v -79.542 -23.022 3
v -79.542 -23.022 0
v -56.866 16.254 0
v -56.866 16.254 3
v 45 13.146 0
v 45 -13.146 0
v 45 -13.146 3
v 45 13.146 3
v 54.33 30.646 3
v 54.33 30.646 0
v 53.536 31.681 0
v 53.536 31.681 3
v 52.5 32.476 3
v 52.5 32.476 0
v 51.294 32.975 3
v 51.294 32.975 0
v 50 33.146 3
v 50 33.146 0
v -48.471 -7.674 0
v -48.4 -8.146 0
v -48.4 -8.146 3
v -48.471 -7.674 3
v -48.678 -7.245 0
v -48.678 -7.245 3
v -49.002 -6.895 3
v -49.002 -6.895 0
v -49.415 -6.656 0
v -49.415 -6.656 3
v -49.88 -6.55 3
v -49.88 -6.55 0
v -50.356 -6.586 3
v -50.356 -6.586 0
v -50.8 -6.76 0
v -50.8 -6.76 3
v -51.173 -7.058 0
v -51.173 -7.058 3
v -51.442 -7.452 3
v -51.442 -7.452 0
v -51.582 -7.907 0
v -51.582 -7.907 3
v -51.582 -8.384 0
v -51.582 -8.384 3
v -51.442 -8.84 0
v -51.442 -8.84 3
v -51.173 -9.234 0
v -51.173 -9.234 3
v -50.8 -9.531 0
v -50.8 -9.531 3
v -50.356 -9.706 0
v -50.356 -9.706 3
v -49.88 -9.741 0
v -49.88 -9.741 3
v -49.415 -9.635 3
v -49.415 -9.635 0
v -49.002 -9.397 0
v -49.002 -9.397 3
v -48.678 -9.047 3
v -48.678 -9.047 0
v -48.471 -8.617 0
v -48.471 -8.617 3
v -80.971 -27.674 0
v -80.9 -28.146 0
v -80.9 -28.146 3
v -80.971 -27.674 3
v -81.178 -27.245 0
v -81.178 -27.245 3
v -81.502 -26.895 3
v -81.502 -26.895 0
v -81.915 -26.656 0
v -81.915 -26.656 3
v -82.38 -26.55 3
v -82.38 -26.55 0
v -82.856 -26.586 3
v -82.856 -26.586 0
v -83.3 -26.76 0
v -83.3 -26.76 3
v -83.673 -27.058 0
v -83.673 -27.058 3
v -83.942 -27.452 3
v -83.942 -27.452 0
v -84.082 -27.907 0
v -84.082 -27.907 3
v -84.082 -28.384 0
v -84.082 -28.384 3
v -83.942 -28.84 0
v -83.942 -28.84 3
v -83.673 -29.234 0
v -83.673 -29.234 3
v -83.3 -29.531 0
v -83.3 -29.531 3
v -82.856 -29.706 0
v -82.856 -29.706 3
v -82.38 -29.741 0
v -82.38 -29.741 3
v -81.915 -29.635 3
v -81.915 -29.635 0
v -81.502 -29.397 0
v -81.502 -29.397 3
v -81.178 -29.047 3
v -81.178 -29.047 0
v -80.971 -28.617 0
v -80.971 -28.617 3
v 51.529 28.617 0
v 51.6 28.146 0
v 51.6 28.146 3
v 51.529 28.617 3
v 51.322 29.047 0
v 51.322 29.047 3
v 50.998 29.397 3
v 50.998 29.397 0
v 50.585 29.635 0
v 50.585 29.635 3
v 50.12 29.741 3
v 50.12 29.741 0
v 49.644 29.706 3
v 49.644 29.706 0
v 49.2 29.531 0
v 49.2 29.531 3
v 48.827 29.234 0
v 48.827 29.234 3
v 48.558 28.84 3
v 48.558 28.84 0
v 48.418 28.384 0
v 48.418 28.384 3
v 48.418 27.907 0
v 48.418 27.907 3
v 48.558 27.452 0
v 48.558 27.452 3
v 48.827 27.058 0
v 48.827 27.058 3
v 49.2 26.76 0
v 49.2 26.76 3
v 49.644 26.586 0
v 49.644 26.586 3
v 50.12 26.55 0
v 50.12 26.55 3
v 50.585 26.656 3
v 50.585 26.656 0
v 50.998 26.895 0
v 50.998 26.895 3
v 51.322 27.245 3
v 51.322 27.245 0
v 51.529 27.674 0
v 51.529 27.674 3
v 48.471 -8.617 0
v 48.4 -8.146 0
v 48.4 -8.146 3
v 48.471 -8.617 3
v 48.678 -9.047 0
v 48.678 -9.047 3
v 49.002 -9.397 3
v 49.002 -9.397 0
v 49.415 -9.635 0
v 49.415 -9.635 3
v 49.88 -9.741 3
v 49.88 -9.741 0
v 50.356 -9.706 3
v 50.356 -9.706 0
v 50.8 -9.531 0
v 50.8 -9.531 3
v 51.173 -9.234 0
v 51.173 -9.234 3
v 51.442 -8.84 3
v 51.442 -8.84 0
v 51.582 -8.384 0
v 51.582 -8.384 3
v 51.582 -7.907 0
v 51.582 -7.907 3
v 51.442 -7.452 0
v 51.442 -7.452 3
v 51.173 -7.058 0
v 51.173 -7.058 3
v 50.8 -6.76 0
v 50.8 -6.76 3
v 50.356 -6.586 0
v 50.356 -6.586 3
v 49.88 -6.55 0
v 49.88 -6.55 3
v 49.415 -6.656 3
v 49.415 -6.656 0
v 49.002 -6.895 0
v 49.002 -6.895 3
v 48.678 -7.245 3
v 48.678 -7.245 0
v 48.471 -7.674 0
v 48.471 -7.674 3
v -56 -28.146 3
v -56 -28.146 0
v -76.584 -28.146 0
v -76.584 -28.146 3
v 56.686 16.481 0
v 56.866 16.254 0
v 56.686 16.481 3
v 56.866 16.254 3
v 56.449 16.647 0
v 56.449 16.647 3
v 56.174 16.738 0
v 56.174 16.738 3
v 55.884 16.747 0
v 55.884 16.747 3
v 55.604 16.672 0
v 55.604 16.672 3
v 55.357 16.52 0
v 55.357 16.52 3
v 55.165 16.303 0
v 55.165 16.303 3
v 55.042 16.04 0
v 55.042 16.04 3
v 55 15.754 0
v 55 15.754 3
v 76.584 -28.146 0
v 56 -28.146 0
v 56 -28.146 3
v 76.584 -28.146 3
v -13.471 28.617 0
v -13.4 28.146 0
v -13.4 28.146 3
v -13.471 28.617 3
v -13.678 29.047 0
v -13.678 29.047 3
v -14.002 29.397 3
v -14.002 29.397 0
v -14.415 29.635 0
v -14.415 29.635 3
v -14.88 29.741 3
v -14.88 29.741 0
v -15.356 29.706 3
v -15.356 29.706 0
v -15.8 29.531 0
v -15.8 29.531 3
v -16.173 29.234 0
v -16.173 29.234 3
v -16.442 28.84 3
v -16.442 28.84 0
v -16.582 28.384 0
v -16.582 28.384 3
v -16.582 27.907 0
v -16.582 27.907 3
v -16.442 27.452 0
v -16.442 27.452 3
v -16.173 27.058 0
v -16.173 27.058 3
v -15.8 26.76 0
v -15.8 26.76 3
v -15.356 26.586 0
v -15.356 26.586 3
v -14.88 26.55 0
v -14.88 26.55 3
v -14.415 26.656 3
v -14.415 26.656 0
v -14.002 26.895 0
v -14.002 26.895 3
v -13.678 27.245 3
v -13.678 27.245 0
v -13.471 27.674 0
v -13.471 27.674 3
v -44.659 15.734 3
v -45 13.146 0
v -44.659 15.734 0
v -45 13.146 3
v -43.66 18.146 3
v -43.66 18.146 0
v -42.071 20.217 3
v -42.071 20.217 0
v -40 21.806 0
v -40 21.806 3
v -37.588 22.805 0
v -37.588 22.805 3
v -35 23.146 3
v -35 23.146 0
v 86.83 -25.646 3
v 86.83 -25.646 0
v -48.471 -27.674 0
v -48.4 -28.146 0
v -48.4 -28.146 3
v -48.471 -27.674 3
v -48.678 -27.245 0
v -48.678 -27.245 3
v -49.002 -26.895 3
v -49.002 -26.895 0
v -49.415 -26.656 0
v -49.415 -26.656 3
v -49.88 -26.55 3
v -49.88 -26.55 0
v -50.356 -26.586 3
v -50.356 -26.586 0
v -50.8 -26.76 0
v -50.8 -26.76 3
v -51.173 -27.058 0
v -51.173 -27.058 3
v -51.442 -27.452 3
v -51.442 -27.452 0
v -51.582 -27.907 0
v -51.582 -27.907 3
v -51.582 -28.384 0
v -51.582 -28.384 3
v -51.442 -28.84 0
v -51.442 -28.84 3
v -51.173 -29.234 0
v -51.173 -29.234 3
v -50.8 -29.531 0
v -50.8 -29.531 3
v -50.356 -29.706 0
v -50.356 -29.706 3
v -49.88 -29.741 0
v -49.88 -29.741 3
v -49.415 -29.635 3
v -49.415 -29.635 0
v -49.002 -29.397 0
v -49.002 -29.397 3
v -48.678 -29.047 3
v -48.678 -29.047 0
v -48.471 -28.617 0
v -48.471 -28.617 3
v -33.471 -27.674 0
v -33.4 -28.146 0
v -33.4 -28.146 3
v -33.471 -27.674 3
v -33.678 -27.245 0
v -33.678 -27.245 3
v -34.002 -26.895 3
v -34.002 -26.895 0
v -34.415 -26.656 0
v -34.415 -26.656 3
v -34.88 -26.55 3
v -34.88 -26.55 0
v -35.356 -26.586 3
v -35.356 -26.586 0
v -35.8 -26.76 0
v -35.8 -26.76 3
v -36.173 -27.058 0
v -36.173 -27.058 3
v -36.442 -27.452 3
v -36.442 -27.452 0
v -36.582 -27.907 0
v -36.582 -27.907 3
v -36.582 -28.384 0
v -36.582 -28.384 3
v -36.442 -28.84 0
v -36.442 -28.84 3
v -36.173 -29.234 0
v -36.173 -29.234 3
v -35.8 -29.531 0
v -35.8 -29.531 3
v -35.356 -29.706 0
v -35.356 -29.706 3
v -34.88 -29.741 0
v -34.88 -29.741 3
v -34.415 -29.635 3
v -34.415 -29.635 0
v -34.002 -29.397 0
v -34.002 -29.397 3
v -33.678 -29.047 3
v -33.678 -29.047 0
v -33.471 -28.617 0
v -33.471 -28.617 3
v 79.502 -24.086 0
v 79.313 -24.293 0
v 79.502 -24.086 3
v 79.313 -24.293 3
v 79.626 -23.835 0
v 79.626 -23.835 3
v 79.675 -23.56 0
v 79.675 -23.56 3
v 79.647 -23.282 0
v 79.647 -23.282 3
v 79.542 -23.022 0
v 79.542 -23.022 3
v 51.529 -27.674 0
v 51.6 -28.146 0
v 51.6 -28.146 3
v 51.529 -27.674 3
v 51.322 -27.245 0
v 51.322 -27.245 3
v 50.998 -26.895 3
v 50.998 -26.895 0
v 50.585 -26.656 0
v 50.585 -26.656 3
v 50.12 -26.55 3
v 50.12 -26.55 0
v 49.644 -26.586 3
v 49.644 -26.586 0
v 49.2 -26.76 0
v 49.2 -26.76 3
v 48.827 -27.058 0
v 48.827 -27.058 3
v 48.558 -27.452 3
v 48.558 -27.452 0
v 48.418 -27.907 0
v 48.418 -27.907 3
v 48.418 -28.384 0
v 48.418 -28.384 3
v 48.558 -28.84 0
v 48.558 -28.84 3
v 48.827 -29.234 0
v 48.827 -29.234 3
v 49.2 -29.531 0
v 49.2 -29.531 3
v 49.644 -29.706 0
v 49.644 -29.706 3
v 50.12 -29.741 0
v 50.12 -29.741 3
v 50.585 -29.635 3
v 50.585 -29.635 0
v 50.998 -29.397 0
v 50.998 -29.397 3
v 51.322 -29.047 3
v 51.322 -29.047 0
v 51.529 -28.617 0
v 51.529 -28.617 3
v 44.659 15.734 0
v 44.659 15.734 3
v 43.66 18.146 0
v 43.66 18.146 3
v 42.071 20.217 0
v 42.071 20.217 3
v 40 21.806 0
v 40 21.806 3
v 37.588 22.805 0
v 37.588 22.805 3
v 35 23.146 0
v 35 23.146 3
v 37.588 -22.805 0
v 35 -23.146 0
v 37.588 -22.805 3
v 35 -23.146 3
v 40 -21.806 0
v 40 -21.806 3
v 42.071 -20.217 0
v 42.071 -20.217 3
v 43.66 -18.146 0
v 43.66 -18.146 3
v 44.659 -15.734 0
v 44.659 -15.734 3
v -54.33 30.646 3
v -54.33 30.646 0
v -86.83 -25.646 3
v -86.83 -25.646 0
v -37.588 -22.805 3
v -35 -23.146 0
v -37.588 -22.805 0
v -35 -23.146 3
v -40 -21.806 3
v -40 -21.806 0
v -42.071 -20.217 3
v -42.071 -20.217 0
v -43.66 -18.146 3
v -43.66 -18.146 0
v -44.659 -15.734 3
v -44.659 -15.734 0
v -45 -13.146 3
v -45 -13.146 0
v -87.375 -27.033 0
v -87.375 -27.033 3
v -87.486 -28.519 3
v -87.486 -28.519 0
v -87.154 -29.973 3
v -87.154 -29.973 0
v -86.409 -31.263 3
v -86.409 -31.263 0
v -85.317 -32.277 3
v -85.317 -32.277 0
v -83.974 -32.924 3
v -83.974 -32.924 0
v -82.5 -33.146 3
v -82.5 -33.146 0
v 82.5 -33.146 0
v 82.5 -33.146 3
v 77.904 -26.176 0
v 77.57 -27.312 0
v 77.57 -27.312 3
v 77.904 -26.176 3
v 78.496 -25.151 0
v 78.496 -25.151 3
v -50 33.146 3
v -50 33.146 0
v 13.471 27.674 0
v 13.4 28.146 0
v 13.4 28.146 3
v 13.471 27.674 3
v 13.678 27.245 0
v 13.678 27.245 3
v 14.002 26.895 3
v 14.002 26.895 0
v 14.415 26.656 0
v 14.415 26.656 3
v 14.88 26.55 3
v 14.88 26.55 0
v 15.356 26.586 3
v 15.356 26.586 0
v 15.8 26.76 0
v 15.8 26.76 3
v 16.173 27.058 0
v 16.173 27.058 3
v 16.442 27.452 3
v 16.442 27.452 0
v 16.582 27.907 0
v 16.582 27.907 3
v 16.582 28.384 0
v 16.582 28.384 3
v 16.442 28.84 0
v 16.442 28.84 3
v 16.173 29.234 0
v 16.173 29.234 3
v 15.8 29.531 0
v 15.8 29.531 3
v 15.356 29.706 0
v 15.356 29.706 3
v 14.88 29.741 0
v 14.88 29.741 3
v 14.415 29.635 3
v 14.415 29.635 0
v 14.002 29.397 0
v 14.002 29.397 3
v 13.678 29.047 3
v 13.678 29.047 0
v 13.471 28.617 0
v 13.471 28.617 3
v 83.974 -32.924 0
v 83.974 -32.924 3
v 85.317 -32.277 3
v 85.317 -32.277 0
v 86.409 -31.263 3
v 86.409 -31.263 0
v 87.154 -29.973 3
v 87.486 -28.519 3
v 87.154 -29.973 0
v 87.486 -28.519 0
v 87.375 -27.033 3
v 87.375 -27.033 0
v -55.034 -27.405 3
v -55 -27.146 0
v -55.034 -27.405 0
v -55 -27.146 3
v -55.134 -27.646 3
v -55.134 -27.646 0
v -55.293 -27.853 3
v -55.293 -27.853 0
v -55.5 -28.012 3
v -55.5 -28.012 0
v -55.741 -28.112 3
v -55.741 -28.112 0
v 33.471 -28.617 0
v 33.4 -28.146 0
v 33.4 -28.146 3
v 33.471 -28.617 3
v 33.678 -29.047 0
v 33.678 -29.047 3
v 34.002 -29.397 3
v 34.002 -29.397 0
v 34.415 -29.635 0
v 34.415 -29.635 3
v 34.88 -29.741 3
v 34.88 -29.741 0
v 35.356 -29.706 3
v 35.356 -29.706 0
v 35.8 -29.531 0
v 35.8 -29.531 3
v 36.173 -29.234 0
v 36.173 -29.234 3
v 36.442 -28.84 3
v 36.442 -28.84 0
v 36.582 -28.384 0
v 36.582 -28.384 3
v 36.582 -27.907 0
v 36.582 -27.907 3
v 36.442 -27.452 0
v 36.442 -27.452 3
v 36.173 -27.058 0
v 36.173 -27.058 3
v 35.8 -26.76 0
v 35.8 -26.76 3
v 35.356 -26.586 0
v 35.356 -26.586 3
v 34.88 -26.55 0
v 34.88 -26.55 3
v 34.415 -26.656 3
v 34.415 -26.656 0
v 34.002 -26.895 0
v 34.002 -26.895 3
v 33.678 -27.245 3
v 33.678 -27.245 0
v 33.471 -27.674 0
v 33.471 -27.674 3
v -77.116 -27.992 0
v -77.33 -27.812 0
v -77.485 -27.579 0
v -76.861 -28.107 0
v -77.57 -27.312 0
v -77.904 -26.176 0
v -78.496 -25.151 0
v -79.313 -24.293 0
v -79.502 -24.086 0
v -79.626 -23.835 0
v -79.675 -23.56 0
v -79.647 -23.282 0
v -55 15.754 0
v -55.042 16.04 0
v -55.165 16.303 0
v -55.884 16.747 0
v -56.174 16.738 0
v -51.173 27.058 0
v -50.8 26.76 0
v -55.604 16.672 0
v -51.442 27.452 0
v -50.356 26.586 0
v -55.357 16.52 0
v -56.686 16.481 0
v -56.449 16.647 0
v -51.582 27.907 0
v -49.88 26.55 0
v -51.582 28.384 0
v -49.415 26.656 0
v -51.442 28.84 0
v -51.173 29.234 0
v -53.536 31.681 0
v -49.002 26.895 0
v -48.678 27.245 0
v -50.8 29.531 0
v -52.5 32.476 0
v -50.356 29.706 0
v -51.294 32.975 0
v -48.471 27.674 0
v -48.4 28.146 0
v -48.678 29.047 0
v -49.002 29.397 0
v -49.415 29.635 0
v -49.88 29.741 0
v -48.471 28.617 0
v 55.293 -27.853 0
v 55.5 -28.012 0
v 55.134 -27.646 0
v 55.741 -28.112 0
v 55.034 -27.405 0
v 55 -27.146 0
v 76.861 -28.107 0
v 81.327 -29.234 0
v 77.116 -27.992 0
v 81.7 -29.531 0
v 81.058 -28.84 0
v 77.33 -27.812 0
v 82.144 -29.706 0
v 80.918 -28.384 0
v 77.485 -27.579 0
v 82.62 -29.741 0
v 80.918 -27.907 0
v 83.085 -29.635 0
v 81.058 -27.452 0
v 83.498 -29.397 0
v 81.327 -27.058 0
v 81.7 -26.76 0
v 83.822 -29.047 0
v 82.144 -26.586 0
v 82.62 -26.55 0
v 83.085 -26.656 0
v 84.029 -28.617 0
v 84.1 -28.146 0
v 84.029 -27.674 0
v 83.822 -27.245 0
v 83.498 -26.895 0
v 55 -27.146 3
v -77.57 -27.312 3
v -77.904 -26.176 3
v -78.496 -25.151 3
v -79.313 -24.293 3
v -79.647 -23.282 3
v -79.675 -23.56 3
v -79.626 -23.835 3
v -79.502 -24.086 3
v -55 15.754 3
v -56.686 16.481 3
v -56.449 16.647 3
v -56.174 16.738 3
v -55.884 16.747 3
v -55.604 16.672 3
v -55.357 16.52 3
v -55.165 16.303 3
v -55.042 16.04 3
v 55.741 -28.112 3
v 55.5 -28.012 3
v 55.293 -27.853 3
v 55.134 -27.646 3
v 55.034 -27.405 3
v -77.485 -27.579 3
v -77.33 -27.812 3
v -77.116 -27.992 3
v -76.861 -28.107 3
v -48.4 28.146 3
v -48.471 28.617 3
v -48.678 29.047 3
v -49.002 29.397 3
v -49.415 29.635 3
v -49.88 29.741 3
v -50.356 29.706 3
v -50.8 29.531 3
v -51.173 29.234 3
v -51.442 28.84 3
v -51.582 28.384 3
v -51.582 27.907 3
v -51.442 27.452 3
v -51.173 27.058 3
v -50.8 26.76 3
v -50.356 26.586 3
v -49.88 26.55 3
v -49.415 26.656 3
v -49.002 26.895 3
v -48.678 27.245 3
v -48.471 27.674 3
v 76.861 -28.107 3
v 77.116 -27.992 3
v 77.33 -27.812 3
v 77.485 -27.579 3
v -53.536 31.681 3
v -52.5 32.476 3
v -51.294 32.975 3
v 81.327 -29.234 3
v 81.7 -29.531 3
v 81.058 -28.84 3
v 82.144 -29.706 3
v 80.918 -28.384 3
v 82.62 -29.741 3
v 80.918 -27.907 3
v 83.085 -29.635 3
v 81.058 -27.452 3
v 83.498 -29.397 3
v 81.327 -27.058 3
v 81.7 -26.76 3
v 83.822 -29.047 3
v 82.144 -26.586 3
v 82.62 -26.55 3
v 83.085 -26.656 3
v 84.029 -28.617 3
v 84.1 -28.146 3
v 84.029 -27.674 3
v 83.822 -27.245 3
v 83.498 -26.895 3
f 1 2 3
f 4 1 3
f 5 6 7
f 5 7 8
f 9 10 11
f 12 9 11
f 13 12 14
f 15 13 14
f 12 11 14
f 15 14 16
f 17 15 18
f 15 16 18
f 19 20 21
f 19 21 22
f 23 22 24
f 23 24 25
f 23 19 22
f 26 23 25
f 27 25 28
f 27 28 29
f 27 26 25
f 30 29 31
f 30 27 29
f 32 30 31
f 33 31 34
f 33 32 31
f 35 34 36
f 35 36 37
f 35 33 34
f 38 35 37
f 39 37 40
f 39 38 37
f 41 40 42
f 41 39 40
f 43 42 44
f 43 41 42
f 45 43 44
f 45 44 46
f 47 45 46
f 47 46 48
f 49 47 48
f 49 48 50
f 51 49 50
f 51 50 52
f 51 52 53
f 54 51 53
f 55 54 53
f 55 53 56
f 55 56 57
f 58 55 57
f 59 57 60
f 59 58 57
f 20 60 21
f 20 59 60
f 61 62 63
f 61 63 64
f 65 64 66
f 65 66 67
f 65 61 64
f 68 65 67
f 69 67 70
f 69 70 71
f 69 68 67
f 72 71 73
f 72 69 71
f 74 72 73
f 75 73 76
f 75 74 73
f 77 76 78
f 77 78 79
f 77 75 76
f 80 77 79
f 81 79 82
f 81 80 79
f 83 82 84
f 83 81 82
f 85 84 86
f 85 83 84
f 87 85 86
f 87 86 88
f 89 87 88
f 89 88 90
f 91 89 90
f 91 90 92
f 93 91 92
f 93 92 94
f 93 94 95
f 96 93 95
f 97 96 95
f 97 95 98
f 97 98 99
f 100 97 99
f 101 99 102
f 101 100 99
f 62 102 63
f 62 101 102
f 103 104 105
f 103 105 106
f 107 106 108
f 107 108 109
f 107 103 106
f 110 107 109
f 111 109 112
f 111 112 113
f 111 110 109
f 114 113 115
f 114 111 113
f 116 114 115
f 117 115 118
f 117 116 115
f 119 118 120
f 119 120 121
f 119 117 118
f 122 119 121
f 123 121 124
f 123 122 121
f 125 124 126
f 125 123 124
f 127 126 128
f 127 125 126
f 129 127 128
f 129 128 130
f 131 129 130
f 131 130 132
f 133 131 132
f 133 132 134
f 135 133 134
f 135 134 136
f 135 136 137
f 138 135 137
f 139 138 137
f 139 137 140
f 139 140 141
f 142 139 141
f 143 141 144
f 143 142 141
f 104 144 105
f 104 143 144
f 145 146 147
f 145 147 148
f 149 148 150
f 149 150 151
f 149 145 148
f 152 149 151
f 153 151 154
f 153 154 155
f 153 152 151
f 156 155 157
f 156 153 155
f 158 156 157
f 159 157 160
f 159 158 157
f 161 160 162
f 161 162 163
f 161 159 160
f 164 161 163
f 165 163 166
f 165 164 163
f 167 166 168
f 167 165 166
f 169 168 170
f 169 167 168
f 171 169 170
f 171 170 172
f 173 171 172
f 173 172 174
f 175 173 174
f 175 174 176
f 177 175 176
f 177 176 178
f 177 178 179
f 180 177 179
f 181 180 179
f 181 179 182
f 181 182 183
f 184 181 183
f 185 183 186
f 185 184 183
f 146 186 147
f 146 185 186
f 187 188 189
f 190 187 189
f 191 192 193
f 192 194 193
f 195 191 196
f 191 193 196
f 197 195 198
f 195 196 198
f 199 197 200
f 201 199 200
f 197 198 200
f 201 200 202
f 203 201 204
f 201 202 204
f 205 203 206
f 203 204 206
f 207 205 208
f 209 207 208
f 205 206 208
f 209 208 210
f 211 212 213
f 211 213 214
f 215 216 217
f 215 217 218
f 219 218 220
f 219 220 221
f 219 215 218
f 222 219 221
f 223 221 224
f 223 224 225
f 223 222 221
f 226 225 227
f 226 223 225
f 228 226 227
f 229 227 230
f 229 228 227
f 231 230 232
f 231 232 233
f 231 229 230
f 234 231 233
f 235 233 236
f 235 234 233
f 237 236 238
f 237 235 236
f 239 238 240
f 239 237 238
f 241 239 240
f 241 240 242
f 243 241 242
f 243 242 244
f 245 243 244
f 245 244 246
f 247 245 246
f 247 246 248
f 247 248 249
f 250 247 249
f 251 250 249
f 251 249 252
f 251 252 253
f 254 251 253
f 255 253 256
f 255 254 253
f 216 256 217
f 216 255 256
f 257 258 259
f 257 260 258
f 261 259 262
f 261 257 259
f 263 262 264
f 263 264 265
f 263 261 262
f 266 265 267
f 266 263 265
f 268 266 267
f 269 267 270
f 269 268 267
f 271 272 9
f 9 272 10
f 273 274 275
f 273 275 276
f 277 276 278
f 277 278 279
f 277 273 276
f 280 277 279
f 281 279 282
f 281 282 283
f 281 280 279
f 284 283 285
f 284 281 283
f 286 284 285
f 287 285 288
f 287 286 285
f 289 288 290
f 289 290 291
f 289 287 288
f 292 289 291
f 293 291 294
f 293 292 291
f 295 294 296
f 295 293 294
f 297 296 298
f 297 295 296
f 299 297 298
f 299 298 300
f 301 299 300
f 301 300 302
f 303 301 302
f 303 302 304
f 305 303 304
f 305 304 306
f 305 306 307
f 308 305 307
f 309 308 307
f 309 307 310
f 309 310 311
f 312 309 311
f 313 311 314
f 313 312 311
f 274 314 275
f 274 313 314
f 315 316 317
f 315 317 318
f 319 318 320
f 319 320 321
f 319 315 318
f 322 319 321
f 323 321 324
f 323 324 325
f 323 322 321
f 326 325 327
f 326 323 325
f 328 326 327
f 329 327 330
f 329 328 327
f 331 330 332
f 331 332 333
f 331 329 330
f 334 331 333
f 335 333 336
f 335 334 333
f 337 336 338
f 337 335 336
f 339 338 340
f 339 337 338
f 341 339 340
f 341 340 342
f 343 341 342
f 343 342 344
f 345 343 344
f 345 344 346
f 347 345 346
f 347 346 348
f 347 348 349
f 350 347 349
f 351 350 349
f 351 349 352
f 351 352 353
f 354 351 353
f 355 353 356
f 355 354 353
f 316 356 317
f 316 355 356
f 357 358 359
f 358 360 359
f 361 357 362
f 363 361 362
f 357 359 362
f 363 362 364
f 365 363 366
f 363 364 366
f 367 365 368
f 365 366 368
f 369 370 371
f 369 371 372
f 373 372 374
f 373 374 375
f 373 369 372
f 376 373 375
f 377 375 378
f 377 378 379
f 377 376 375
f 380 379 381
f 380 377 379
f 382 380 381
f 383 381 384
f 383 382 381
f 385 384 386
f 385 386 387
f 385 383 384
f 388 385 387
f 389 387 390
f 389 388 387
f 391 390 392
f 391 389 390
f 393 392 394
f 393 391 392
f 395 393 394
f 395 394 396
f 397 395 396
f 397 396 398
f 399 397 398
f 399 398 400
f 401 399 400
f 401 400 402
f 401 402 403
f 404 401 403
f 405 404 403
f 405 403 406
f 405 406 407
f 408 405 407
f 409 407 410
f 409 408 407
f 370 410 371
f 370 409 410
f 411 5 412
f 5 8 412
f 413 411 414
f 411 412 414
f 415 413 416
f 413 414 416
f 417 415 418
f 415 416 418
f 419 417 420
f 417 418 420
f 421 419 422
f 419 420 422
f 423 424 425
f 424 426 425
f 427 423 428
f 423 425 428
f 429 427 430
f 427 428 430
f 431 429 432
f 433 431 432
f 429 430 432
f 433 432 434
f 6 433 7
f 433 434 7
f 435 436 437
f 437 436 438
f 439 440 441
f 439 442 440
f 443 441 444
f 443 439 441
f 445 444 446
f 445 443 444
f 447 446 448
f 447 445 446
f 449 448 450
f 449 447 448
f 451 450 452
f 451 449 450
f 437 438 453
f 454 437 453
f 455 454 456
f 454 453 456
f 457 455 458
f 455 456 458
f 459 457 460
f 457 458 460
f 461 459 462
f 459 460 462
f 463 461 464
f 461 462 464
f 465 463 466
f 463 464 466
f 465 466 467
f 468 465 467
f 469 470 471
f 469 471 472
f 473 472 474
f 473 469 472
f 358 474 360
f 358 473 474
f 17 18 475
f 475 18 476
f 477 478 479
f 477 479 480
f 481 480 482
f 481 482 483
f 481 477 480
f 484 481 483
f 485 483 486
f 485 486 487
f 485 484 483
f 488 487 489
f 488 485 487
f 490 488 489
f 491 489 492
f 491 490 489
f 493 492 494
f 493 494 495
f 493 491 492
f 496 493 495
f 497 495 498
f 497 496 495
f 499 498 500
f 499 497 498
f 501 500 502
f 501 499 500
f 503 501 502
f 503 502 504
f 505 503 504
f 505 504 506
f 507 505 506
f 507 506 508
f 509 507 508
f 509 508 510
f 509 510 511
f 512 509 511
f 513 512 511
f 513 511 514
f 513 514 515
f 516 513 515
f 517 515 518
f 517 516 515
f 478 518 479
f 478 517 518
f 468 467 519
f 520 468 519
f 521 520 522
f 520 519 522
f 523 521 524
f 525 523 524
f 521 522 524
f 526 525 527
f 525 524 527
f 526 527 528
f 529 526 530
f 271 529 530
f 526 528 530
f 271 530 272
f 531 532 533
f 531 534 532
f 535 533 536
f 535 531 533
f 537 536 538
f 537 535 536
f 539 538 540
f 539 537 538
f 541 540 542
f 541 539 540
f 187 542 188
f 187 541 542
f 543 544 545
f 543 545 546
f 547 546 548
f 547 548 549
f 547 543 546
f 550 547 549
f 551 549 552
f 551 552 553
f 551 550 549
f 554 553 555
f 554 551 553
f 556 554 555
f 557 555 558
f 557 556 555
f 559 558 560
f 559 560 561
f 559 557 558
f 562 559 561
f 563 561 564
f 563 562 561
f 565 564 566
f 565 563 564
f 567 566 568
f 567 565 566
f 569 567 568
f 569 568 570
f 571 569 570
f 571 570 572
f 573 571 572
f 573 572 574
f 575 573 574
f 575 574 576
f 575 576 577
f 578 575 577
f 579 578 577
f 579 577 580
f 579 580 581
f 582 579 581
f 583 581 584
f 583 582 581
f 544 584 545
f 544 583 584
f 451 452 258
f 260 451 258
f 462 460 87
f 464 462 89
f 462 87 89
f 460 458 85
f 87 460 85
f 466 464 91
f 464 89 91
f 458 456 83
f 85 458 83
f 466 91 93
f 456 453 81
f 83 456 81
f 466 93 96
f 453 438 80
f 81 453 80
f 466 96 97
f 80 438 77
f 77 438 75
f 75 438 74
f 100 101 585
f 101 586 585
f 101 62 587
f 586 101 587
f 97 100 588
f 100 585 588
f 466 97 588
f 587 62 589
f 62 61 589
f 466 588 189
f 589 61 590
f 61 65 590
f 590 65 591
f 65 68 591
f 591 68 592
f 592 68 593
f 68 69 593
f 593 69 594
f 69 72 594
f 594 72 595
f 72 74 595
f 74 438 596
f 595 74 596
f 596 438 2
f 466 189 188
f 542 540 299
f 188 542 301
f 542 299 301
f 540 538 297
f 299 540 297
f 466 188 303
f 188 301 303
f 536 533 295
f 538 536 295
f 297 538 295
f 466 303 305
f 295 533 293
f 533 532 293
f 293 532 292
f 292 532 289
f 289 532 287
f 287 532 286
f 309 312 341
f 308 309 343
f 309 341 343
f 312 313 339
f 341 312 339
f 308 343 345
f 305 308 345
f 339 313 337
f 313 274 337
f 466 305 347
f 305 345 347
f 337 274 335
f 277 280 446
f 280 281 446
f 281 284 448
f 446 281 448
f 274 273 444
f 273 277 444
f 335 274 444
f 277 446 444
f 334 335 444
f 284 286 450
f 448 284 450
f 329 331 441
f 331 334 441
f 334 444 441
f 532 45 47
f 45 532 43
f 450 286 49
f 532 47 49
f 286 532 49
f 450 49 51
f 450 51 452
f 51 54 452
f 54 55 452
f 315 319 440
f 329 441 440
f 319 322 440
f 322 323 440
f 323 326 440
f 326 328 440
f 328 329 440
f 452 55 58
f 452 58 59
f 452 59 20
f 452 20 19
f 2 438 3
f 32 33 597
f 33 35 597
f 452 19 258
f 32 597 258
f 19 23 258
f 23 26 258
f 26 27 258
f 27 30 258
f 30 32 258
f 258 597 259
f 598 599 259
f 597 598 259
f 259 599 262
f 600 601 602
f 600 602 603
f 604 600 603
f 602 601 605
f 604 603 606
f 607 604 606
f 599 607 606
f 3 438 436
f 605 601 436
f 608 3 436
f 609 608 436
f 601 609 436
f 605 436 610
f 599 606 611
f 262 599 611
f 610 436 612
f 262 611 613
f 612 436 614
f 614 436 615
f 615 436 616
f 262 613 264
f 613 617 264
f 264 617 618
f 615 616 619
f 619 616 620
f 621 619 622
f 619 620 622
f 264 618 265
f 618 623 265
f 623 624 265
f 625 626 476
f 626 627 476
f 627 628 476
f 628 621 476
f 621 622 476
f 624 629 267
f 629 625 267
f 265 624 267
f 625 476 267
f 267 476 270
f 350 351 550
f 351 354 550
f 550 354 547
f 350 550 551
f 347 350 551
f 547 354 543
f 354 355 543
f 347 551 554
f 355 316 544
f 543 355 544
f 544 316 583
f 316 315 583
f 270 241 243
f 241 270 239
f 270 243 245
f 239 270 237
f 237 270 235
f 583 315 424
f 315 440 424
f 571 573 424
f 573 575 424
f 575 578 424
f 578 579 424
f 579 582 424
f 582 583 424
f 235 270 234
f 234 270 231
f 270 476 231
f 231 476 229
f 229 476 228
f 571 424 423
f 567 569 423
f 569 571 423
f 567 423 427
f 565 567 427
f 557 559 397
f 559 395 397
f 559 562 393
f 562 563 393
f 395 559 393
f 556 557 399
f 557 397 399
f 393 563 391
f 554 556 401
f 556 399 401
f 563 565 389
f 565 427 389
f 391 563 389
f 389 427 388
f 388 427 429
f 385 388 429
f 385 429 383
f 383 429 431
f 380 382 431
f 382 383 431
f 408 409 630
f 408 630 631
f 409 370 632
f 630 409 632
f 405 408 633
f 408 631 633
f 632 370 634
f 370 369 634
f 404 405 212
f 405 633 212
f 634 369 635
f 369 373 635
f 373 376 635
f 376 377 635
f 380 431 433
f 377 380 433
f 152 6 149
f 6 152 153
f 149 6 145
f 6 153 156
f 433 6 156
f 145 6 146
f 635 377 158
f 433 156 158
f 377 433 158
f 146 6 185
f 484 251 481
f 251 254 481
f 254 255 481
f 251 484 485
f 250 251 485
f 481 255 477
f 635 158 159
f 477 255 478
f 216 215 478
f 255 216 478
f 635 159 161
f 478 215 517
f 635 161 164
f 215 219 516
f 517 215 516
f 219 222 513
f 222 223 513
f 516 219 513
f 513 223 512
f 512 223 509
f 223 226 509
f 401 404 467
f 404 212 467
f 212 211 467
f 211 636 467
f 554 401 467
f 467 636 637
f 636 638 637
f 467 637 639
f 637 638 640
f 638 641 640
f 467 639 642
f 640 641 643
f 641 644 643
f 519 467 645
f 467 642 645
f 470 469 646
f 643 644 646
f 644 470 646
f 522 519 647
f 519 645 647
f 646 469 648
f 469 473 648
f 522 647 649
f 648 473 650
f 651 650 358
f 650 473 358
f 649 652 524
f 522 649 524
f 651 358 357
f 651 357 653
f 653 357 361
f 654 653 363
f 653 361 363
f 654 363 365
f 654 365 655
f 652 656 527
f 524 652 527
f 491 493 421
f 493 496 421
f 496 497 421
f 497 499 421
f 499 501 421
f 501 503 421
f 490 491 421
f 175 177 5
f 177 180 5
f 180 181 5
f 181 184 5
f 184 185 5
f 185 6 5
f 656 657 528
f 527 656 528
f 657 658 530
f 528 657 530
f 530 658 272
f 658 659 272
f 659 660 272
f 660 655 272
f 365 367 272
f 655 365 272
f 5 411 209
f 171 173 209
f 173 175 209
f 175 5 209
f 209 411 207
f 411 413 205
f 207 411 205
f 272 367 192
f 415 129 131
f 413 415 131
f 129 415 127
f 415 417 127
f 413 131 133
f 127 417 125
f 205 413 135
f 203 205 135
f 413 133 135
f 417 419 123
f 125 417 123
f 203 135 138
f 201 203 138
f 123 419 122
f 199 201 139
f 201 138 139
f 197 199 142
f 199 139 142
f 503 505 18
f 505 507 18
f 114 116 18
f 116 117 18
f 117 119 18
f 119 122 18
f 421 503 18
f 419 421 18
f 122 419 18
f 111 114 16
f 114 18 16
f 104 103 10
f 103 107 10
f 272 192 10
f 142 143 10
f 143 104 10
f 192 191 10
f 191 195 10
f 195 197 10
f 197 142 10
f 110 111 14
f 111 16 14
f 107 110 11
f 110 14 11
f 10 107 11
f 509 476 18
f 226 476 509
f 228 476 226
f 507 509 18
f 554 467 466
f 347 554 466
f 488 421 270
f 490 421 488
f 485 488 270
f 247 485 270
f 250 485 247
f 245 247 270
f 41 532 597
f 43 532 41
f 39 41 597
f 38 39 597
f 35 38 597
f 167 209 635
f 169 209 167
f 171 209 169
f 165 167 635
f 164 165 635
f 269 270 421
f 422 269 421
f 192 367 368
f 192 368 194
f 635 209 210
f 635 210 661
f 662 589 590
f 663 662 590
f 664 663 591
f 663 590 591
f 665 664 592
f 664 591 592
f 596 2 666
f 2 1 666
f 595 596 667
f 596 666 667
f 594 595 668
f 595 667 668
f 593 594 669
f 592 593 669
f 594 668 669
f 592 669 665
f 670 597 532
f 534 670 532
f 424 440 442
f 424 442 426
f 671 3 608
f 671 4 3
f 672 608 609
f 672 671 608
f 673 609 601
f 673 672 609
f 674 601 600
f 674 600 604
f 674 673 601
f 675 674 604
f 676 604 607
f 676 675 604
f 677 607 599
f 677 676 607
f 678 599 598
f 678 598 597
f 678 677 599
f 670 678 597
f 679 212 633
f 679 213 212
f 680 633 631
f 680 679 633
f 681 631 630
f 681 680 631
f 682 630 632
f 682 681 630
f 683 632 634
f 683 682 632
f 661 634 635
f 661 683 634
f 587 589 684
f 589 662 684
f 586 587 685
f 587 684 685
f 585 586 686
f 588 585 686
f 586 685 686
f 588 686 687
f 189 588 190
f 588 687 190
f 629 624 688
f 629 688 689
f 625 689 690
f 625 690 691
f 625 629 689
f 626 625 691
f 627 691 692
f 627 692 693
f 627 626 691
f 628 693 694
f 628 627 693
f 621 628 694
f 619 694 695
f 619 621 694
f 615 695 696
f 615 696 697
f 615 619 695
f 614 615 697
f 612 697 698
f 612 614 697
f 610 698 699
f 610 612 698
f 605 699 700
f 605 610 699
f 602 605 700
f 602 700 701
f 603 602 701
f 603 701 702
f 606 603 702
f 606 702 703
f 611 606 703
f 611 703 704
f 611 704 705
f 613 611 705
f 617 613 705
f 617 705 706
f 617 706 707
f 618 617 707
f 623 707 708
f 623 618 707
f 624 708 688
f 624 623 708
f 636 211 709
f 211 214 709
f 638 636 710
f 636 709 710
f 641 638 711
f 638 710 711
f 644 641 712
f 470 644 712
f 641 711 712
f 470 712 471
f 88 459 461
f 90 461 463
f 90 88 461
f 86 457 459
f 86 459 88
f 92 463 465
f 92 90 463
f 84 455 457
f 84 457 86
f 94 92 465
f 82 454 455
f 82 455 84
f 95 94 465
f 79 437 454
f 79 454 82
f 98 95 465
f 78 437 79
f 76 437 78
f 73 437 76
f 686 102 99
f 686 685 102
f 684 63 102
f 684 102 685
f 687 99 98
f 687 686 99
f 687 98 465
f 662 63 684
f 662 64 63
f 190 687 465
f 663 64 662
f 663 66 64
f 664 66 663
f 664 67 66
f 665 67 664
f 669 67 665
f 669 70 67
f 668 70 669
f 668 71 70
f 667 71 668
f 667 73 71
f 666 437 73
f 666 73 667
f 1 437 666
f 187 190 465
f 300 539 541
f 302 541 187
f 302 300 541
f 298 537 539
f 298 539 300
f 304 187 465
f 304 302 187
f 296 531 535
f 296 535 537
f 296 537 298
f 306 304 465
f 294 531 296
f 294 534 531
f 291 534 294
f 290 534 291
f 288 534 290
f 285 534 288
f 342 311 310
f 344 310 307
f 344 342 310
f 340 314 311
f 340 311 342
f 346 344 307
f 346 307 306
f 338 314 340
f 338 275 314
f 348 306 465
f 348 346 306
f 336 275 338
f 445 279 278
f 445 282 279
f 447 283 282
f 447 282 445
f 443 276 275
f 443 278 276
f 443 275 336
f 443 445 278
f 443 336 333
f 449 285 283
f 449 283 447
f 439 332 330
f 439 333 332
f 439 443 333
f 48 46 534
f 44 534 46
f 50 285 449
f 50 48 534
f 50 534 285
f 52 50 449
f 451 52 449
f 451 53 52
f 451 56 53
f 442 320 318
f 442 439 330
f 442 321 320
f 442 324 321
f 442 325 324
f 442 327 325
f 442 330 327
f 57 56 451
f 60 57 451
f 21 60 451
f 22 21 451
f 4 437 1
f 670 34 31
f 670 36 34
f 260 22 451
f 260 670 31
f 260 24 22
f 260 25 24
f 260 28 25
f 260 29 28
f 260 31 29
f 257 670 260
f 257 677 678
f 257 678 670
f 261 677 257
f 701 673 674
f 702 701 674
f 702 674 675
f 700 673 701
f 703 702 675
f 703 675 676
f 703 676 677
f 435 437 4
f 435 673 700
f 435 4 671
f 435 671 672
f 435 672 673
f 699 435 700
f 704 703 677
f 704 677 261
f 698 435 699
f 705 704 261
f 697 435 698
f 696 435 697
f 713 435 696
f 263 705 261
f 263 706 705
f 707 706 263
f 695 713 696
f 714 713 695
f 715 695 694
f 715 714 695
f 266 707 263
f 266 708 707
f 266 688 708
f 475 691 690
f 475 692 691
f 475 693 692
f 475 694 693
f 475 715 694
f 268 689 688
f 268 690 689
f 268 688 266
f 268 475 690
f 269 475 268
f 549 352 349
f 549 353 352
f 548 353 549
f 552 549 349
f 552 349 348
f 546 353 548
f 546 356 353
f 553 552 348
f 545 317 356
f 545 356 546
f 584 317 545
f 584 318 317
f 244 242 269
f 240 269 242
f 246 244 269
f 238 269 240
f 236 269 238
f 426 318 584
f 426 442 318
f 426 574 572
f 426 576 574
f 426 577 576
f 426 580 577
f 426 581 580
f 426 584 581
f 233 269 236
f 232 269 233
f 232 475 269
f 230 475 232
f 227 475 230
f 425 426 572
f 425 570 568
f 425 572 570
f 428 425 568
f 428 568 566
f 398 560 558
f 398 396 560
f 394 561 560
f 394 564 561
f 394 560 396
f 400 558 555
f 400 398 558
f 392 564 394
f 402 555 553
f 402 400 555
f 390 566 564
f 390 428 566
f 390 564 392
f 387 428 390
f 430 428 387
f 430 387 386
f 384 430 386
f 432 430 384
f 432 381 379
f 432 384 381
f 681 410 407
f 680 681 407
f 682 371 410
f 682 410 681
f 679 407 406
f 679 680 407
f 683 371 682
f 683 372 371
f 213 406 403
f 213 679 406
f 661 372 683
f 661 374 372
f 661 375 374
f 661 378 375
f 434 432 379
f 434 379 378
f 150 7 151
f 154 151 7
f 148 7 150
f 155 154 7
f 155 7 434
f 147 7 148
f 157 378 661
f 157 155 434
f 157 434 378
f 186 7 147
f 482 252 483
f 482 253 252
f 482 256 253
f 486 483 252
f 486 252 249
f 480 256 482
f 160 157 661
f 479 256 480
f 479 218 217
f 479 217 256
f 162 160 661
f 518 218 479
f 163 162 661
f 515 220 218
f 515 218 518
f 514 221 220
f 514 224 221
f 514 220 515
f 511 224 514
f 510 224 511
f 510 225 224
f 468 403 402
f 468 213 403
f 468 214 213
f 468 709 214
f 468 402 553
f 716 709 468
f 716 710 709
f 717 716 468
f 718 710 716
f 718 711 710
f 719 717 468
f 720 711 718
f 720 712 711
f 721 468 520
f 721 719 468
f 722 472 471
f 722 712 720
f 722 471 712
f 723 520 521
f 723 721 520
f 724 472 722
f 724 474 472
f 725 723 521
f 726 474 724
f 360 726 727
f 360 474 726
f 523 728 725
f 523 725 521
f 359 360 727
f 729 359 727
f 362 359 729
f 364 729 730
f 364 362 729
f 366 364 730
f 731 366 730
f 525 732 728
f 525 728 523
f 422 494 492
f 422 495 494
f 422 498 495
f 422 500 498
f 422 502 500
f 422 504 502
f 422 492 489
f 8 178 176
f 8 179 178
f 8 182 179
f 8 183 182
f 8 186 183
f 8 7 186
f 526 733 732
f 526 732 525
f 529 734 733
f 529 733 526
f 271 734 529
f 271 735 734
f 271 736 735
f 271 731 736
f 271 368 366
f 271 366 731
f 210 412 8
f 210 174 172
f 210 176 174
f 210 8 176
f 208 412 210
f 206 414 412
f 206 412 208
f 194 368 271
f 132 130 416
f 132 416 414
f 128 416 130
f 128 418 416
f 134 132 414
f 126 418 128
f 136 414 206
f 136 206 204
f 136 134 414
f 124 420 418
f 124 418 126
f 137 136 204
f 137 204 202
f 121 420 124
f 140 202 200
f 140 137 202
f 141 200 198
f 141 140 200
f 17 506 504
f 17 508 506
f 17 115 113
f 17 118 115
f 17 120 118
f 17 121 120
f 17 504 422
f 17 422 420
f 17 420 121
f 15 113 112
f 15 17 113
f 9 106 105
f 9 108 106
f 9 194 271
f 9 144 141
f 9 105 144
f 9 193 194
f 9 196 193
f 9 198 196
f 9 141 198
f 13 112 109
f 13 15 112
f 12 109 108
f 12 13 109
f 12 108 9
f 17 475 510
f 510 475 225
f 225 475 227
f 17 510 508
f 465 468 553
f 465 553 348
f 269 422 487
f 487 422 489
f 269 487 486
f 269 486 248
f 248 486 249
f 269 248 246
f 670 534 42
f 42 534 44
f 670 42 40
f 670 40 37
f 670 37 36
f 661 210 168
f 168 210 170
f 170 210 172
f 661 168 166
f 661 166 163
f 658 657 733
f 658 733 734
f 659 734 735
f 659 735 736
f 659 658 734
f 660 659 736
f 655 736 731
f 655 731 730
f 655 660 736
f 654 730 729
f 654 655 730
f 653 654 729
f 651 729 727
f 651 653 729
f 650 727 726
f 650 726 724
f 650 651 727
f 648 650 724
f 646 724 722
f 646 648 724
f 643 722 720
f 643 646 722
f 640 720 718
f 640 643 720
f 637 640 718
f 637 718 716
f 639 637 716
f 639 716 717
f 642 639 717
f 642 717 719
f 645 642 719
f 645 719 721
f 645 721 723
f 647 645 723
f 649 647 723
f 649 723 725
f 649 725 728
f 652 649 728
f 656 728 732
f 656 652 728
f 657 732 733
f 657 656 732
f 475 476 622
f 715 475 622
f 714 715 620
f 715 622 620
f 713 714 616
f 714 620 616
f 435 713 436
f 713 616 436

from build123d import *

# Parameters (mm, degrees)
SKETCH_1_R      = 1.6
SKETCH_1_W      = 90
SKETCH_1_H      = 46.291651246
EXTRUDE_1_DEPTH = 3
FILLET_1_R      = 1
FILLET_2_R      = 10


with BuildPart() as part:
    # ｽｹｯﾁ1 → ﾎﾞｽ - 押し出し1 (new body)
    with BuildSketch(Plane.XY):
        with BuildLine():
            Line((50, 33.145825623), (-50, 33.145825623))
            ThreePointArc((-50, 33.145825623), (-52.5, 32.475952642), (-54.330127019, 30.645825623))
            Line((-54.330127019, 30.645825623), (-86.830127019, -25.645825623))
            ThreePointArc((-86.830127019, -25.645825623), (-86.830127019, -30.645825623), (-82.5, -33.145825623))
            Line((-82.5, -33.145825623), (-50, -33.145825623))
            Line((-50, -33.145825623), (50, -33.145825623))
            Line((50, -33.145825623), (82.5, -33.145825623))
            ThreePointArc((82.5, -33.145825623), (86.830127019, -30.645825623), (86.830127019, -25.645825623))
            Line((86.830127019, -25.645825623), (54.330127019, 30.645825623))
            ThreePointArc((54.330127019, 30.645825623), (52.5, 32.475952642), (50, 33.145825623))
        make_face()
        with Locations((-50, 28.145825623)):
            Circle(SKETCH_1_R, mode=Mode.SUBTRACT)
        with Locations((-82.5, -28.145825623)):
            Circle(SKETCH_1_R, mode=Mode.SUBTRACT)
        with Locations((50, 28.145825623)):
            Circle(SKETCH_1_R, mode=Mode.SUBTRACT)
        with Locations((82.5, -28.145825623)):
            Circle(SKETCH_1_R, mode=Mode.SUBTRACT)
        with Locations((-50, -28.145825623)):
            Circle(SKETCH_1_R, mode=Mode.SUBTRACT)
        with Locations((50, -28.145825623)):
            Circle(SKETCH_1_R, mode=Mode.SUBTRACT)
        with Locations((-35, -28.145825623)):
            Circle(SKETCH_1_R, mode=Mode.SUBTRACT)
        with Locations(Location((35, -28.145825623, 0), (0, 0, 180))):
            Circle(SKETCH_1_R, mode=Mode.SUBTRACT)
        with Locations((-15, 28.145825623)):
            Circle(SKETCH_1_R, mode=Mode.SUBTRACT)
        with Locations(Location((15, 28.145825623, 0), (0, 0, 180))):
            Circle(SKETCH_1_R, mode=Mode.SUBTRACT)
        with Locations((-50, -8.145825623)):
            Circle(SKETCH_1_R, mode=Mode.SUBTRACT)
        with Locations(Location((50, -8.145825623, 0), (0, 0, 180))):
            Circle(SKETCH_1_R, mode=Mode.SUBTRACT)
        Rectangle(SKETCH_1_W, SKETCH_1_H, mode=Mode.SUBTRACT)
        with BuildLine():
            Line((-55, 19.485571585), (-55, -28.145825623))
            Line((-55, -28.145825623), (-77.5, -28.145825623))
            ThreePointArc((-77.5, -28.145825623), (-78.169872981, -25.645825623), (-80, -23.815698604))
            Line((-80, -23.815698604), (-55, 19.485571585))
        make_face(mode=Mode.SUBTRACT)
        with BuildLine():
            Line((55, -28.145825623), (77.5, -28.145825623))
            ThreePointArc((77.5, -28.145825623), (78.169872981, -25.645825623), (80, -23.815698604))
            Line((80, -23.815698604), (55, 19.485571585))
            Line((55, 19.485571585), (55, -28.145825623))
        make_face(mode=Mode.SUBTRACT)
    extrude(amount=EXTRUDE_1_DEPTH)

    # ﾌｨﾚｯﾄ1
    fillet_1_edges = [part.edges().sort_by_distance(p)[0] for p in [
        (-55, 19.485571585, 1.5),
        (-80, -23.815698604, 1.5),
        (-77.5, -28.145825623, 1.5),
        (-55, -28.145825623, 1.5),
        (77.5, -28.145825623, 1.5),
        (80, -23.815698604, 1.5),
        (55, 19.485571585, 1.5),
        (55, -28.145825623, 1.5),
    ]]
    fillet(fillet_1_edges, radius=FILLET_1_R)

    # ﾌｨﾚｯﾄ2
    fillet_2_edges = [part.edges().sort_by_distance(p)[0] for p in [
        (45, -23.145825623, 1.5),
        (45, 23.145825623, 1.5),
        (-45, 23.145825623, 1.5),
        (-45, -23.145825623, 1.5),
    ]]
    fillet(fillet_2_edges, radius=FILLET_2_R)


solid = part.part
